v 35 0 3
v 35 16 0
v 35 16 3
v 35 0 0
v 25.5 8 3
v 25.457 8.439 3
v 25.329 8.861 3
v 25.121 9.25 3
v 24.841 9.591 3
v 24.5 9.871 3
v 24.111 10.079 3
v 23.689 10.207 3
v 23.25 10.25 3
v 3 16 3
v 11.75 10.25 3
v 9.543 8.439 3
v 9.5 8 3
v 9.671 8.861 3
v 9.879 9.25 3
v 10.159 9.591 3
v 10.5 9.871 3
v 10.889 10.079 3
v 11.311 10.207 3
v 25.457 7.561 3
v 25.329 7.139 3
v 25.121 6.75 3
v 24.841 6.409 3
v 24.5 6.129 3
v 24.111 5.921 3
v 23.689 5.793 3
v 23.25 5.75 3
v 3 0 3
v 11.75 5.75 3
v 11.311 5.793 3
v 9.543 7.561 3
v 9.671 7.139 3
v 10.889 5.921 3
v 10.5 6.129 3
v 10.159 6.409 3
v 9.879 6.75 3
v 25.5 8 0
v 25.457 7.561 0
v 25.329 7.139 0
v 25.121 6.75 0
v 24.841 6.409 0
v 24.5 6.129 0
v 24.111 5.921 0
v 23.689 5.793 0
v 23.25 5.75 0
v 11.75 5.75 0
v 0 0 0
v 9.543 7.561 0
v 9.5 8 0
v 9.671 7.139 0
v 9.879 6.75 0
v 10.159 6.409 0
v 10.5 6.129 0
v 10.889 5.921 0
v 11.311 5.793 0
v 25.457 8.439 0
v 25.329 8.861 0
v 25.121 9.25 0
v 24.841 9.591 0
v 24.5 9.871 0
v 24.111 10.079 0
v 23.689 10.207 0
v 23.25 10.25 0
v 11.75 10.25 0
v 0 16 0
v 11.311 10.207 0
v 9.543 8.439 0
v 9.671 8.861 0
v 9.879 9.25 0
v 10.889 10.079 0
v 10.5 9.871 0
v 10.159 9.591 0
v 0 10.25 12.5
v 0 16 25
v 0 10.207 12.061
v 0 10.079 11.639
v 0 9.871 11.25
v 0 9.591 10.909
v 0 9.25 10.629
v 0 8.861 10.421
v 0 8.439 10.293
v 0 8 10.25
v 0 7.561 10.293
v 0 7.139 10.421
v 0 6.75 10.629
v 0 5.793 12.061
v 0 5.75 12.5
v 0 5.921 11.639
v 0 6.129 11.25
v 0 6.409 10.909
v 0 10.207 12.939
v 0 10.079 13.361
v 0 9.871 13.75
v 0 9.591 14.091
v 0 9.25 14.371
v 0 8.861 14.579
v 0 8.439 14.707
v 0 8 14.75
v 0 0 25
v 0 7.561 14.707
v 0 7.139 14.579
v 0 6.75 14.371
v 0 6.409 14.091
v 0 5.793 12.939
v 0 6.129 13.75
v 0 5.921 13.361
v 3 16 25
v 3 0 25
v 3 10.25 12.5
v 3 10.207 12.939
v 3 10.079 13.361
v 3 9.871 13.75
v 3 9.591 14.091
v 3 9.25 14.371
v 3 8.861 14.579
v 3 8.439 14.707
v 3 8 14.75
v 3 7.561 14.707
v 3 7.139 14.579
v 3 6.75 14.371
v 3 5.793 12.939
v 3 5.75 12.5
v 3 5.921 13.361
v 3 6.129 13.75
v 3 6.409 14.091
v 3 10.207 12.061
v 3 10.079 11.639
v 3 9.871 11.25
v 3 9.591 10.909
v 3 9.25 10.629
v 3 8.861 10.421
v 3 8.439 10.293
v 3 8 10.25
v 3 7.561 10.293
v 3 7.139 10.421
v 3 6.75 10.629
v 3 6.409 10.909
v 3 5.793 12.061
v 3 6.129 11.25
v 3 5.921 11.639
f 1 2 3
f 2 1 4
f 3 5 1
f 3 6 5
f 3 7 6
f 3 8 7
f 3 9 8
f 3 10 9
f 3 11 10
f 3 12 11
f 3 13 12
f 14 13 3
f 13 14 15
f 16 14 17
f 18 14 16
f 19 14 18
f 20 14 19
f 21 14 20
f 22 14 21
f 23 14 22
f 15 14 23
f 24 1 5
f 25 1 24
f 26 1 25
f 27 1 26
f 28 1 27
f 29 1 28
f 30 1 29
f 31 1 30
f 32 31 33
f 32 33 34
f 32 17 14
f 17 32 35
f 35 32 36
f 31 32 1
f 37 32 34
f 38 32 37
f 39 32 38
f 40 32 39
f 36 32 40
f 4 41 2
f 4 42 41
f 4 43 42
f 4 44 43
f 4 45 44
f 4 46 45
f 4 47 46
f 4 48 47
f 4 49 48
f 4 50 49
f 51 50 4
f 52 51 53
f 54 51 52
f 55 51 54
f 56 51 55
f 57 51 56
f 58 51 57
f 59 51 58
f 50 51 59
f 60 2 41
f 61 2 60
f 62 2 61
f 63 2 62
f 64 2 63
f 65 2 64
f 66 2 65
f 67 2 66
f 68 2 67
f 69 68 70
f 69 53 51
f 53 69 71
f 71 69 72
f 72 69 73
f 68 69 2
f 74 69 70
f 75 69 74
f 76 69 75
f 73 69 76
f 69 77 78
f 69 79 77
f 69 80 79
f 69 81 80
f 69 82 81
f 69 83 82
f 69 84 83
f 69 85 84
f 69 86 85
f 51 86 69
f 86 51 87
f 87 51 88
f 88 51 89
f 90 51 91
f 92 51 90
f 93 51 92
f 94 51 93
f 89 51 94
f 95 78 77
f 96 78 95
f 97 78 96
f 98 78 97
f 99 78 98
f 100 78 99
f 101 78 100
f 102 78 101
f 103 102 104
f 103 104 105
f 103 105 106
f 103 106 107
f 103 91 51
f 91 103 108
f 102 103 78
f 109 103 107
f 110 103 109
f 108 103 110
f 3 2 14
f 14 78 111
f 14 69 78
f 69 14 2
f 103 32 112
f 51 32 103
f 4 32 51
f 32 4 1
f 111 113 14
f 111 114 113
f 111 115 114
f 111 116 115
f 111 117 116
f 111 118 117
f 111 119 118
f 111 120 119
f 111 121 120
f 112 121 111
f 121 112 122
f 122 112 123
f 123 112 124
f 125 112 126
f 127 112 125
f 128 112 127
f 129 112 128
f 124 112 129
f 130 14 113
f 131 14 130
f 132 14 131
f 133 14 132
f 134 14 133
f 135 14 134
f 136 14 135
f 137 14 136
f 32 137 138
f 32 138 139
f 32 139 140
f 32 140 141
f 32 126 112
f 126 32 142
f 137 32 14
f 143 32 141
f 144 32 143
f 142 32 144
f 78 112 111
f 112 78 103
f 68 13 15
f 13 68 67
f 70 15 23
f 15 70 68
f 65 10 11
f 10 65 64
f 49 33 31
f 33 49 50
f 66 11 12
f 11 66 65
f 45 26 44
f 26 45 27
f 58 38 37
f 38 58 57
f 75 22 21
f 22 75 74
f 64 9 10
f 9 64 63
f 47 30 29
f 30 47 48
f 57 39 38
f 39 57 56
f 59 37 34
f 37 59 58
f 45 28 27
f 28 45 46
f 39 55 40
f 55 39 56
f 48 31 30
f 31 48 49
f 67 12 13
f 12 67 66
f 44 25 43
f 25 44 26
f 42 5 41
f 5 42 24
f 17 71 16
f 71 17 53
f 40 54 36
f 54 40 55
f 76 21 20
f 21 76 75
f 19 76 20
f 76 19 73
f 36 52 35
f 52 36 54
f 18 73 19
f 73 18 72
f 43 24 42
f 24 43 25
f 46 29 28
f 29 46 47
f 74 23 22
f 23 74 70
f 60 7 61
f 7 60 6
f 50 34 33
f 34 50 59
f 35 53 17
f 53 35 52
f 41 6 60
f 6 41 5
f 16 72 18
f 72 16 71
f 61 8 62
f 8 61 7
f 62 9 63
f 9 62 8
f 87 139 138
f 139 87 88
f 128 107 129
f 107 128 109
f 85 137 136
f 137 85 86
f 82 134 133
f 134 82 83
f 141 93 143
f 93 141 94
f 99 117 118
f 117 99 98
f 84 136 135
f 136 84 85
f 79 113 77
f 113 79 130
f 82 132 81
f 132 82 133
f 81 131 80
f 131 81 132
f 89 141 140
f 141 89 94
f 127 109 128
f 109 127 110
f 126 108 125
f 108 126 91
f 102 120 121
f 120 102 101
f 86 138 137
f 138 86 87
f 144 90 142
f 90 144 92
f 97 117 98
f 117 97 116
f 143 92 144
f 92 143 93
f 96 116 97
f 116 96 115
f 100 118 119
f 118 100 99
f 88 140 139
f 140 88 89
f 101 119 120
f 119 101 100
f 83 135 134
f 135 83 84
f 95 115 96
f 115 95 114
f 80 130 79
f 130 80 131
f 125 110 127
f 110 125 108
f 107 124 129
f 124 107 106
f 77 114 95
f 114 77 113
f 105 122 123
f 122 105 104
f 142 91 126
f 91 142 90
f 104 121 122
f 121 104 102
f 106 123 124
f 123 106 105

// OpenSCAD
$fn = 32;

// ----------------------------------------------------------------------
// L-bracket: 35 x 16 x 25 mm
// ----------------------------------------------------------------------

// --- parameters (mm) ---
arm_x = 35;               // horizontal leg, X
arm_z = 25;               // vertical leg, Z
width = 16;               // bracket depth, Y
wall = 3;                 // plate thickness
hole_d = 4.5;             // clearance for M4
slot_l = 16;              // adjustment slot length

module hole_z(px, py) {
  translate([px, py, -2.5]) cylinder(h = wall + 5, d = hole_d);
}
module hole_x(pz, py) {
  translate([-2.5, py, pz]) rotate([0, 90, 0]) cylinder(h = wall + 5, d = hole_d);
}
module adjust_slot(px, py) {
  hull() {
    translate([px - (slot_l - hole_d) / 2, py, -2.5]) cylinder(h = wall + 5, d = hole_d);
    translate([px + (slot_l - hole_d) / 2, py, -2.5]) cylinder(h = wall + 5, d = hole_d);
  }
}

difference() {
  union() {
    /* horizontal leg */
    cube([arm_x, width, wall]);
    /* vertical leg, overlapping the corner block */
    cube([wall, width, arm_z]);
  }
  adjust_slot(17.5, 8);
  hole_x(12.5, 8);
}
